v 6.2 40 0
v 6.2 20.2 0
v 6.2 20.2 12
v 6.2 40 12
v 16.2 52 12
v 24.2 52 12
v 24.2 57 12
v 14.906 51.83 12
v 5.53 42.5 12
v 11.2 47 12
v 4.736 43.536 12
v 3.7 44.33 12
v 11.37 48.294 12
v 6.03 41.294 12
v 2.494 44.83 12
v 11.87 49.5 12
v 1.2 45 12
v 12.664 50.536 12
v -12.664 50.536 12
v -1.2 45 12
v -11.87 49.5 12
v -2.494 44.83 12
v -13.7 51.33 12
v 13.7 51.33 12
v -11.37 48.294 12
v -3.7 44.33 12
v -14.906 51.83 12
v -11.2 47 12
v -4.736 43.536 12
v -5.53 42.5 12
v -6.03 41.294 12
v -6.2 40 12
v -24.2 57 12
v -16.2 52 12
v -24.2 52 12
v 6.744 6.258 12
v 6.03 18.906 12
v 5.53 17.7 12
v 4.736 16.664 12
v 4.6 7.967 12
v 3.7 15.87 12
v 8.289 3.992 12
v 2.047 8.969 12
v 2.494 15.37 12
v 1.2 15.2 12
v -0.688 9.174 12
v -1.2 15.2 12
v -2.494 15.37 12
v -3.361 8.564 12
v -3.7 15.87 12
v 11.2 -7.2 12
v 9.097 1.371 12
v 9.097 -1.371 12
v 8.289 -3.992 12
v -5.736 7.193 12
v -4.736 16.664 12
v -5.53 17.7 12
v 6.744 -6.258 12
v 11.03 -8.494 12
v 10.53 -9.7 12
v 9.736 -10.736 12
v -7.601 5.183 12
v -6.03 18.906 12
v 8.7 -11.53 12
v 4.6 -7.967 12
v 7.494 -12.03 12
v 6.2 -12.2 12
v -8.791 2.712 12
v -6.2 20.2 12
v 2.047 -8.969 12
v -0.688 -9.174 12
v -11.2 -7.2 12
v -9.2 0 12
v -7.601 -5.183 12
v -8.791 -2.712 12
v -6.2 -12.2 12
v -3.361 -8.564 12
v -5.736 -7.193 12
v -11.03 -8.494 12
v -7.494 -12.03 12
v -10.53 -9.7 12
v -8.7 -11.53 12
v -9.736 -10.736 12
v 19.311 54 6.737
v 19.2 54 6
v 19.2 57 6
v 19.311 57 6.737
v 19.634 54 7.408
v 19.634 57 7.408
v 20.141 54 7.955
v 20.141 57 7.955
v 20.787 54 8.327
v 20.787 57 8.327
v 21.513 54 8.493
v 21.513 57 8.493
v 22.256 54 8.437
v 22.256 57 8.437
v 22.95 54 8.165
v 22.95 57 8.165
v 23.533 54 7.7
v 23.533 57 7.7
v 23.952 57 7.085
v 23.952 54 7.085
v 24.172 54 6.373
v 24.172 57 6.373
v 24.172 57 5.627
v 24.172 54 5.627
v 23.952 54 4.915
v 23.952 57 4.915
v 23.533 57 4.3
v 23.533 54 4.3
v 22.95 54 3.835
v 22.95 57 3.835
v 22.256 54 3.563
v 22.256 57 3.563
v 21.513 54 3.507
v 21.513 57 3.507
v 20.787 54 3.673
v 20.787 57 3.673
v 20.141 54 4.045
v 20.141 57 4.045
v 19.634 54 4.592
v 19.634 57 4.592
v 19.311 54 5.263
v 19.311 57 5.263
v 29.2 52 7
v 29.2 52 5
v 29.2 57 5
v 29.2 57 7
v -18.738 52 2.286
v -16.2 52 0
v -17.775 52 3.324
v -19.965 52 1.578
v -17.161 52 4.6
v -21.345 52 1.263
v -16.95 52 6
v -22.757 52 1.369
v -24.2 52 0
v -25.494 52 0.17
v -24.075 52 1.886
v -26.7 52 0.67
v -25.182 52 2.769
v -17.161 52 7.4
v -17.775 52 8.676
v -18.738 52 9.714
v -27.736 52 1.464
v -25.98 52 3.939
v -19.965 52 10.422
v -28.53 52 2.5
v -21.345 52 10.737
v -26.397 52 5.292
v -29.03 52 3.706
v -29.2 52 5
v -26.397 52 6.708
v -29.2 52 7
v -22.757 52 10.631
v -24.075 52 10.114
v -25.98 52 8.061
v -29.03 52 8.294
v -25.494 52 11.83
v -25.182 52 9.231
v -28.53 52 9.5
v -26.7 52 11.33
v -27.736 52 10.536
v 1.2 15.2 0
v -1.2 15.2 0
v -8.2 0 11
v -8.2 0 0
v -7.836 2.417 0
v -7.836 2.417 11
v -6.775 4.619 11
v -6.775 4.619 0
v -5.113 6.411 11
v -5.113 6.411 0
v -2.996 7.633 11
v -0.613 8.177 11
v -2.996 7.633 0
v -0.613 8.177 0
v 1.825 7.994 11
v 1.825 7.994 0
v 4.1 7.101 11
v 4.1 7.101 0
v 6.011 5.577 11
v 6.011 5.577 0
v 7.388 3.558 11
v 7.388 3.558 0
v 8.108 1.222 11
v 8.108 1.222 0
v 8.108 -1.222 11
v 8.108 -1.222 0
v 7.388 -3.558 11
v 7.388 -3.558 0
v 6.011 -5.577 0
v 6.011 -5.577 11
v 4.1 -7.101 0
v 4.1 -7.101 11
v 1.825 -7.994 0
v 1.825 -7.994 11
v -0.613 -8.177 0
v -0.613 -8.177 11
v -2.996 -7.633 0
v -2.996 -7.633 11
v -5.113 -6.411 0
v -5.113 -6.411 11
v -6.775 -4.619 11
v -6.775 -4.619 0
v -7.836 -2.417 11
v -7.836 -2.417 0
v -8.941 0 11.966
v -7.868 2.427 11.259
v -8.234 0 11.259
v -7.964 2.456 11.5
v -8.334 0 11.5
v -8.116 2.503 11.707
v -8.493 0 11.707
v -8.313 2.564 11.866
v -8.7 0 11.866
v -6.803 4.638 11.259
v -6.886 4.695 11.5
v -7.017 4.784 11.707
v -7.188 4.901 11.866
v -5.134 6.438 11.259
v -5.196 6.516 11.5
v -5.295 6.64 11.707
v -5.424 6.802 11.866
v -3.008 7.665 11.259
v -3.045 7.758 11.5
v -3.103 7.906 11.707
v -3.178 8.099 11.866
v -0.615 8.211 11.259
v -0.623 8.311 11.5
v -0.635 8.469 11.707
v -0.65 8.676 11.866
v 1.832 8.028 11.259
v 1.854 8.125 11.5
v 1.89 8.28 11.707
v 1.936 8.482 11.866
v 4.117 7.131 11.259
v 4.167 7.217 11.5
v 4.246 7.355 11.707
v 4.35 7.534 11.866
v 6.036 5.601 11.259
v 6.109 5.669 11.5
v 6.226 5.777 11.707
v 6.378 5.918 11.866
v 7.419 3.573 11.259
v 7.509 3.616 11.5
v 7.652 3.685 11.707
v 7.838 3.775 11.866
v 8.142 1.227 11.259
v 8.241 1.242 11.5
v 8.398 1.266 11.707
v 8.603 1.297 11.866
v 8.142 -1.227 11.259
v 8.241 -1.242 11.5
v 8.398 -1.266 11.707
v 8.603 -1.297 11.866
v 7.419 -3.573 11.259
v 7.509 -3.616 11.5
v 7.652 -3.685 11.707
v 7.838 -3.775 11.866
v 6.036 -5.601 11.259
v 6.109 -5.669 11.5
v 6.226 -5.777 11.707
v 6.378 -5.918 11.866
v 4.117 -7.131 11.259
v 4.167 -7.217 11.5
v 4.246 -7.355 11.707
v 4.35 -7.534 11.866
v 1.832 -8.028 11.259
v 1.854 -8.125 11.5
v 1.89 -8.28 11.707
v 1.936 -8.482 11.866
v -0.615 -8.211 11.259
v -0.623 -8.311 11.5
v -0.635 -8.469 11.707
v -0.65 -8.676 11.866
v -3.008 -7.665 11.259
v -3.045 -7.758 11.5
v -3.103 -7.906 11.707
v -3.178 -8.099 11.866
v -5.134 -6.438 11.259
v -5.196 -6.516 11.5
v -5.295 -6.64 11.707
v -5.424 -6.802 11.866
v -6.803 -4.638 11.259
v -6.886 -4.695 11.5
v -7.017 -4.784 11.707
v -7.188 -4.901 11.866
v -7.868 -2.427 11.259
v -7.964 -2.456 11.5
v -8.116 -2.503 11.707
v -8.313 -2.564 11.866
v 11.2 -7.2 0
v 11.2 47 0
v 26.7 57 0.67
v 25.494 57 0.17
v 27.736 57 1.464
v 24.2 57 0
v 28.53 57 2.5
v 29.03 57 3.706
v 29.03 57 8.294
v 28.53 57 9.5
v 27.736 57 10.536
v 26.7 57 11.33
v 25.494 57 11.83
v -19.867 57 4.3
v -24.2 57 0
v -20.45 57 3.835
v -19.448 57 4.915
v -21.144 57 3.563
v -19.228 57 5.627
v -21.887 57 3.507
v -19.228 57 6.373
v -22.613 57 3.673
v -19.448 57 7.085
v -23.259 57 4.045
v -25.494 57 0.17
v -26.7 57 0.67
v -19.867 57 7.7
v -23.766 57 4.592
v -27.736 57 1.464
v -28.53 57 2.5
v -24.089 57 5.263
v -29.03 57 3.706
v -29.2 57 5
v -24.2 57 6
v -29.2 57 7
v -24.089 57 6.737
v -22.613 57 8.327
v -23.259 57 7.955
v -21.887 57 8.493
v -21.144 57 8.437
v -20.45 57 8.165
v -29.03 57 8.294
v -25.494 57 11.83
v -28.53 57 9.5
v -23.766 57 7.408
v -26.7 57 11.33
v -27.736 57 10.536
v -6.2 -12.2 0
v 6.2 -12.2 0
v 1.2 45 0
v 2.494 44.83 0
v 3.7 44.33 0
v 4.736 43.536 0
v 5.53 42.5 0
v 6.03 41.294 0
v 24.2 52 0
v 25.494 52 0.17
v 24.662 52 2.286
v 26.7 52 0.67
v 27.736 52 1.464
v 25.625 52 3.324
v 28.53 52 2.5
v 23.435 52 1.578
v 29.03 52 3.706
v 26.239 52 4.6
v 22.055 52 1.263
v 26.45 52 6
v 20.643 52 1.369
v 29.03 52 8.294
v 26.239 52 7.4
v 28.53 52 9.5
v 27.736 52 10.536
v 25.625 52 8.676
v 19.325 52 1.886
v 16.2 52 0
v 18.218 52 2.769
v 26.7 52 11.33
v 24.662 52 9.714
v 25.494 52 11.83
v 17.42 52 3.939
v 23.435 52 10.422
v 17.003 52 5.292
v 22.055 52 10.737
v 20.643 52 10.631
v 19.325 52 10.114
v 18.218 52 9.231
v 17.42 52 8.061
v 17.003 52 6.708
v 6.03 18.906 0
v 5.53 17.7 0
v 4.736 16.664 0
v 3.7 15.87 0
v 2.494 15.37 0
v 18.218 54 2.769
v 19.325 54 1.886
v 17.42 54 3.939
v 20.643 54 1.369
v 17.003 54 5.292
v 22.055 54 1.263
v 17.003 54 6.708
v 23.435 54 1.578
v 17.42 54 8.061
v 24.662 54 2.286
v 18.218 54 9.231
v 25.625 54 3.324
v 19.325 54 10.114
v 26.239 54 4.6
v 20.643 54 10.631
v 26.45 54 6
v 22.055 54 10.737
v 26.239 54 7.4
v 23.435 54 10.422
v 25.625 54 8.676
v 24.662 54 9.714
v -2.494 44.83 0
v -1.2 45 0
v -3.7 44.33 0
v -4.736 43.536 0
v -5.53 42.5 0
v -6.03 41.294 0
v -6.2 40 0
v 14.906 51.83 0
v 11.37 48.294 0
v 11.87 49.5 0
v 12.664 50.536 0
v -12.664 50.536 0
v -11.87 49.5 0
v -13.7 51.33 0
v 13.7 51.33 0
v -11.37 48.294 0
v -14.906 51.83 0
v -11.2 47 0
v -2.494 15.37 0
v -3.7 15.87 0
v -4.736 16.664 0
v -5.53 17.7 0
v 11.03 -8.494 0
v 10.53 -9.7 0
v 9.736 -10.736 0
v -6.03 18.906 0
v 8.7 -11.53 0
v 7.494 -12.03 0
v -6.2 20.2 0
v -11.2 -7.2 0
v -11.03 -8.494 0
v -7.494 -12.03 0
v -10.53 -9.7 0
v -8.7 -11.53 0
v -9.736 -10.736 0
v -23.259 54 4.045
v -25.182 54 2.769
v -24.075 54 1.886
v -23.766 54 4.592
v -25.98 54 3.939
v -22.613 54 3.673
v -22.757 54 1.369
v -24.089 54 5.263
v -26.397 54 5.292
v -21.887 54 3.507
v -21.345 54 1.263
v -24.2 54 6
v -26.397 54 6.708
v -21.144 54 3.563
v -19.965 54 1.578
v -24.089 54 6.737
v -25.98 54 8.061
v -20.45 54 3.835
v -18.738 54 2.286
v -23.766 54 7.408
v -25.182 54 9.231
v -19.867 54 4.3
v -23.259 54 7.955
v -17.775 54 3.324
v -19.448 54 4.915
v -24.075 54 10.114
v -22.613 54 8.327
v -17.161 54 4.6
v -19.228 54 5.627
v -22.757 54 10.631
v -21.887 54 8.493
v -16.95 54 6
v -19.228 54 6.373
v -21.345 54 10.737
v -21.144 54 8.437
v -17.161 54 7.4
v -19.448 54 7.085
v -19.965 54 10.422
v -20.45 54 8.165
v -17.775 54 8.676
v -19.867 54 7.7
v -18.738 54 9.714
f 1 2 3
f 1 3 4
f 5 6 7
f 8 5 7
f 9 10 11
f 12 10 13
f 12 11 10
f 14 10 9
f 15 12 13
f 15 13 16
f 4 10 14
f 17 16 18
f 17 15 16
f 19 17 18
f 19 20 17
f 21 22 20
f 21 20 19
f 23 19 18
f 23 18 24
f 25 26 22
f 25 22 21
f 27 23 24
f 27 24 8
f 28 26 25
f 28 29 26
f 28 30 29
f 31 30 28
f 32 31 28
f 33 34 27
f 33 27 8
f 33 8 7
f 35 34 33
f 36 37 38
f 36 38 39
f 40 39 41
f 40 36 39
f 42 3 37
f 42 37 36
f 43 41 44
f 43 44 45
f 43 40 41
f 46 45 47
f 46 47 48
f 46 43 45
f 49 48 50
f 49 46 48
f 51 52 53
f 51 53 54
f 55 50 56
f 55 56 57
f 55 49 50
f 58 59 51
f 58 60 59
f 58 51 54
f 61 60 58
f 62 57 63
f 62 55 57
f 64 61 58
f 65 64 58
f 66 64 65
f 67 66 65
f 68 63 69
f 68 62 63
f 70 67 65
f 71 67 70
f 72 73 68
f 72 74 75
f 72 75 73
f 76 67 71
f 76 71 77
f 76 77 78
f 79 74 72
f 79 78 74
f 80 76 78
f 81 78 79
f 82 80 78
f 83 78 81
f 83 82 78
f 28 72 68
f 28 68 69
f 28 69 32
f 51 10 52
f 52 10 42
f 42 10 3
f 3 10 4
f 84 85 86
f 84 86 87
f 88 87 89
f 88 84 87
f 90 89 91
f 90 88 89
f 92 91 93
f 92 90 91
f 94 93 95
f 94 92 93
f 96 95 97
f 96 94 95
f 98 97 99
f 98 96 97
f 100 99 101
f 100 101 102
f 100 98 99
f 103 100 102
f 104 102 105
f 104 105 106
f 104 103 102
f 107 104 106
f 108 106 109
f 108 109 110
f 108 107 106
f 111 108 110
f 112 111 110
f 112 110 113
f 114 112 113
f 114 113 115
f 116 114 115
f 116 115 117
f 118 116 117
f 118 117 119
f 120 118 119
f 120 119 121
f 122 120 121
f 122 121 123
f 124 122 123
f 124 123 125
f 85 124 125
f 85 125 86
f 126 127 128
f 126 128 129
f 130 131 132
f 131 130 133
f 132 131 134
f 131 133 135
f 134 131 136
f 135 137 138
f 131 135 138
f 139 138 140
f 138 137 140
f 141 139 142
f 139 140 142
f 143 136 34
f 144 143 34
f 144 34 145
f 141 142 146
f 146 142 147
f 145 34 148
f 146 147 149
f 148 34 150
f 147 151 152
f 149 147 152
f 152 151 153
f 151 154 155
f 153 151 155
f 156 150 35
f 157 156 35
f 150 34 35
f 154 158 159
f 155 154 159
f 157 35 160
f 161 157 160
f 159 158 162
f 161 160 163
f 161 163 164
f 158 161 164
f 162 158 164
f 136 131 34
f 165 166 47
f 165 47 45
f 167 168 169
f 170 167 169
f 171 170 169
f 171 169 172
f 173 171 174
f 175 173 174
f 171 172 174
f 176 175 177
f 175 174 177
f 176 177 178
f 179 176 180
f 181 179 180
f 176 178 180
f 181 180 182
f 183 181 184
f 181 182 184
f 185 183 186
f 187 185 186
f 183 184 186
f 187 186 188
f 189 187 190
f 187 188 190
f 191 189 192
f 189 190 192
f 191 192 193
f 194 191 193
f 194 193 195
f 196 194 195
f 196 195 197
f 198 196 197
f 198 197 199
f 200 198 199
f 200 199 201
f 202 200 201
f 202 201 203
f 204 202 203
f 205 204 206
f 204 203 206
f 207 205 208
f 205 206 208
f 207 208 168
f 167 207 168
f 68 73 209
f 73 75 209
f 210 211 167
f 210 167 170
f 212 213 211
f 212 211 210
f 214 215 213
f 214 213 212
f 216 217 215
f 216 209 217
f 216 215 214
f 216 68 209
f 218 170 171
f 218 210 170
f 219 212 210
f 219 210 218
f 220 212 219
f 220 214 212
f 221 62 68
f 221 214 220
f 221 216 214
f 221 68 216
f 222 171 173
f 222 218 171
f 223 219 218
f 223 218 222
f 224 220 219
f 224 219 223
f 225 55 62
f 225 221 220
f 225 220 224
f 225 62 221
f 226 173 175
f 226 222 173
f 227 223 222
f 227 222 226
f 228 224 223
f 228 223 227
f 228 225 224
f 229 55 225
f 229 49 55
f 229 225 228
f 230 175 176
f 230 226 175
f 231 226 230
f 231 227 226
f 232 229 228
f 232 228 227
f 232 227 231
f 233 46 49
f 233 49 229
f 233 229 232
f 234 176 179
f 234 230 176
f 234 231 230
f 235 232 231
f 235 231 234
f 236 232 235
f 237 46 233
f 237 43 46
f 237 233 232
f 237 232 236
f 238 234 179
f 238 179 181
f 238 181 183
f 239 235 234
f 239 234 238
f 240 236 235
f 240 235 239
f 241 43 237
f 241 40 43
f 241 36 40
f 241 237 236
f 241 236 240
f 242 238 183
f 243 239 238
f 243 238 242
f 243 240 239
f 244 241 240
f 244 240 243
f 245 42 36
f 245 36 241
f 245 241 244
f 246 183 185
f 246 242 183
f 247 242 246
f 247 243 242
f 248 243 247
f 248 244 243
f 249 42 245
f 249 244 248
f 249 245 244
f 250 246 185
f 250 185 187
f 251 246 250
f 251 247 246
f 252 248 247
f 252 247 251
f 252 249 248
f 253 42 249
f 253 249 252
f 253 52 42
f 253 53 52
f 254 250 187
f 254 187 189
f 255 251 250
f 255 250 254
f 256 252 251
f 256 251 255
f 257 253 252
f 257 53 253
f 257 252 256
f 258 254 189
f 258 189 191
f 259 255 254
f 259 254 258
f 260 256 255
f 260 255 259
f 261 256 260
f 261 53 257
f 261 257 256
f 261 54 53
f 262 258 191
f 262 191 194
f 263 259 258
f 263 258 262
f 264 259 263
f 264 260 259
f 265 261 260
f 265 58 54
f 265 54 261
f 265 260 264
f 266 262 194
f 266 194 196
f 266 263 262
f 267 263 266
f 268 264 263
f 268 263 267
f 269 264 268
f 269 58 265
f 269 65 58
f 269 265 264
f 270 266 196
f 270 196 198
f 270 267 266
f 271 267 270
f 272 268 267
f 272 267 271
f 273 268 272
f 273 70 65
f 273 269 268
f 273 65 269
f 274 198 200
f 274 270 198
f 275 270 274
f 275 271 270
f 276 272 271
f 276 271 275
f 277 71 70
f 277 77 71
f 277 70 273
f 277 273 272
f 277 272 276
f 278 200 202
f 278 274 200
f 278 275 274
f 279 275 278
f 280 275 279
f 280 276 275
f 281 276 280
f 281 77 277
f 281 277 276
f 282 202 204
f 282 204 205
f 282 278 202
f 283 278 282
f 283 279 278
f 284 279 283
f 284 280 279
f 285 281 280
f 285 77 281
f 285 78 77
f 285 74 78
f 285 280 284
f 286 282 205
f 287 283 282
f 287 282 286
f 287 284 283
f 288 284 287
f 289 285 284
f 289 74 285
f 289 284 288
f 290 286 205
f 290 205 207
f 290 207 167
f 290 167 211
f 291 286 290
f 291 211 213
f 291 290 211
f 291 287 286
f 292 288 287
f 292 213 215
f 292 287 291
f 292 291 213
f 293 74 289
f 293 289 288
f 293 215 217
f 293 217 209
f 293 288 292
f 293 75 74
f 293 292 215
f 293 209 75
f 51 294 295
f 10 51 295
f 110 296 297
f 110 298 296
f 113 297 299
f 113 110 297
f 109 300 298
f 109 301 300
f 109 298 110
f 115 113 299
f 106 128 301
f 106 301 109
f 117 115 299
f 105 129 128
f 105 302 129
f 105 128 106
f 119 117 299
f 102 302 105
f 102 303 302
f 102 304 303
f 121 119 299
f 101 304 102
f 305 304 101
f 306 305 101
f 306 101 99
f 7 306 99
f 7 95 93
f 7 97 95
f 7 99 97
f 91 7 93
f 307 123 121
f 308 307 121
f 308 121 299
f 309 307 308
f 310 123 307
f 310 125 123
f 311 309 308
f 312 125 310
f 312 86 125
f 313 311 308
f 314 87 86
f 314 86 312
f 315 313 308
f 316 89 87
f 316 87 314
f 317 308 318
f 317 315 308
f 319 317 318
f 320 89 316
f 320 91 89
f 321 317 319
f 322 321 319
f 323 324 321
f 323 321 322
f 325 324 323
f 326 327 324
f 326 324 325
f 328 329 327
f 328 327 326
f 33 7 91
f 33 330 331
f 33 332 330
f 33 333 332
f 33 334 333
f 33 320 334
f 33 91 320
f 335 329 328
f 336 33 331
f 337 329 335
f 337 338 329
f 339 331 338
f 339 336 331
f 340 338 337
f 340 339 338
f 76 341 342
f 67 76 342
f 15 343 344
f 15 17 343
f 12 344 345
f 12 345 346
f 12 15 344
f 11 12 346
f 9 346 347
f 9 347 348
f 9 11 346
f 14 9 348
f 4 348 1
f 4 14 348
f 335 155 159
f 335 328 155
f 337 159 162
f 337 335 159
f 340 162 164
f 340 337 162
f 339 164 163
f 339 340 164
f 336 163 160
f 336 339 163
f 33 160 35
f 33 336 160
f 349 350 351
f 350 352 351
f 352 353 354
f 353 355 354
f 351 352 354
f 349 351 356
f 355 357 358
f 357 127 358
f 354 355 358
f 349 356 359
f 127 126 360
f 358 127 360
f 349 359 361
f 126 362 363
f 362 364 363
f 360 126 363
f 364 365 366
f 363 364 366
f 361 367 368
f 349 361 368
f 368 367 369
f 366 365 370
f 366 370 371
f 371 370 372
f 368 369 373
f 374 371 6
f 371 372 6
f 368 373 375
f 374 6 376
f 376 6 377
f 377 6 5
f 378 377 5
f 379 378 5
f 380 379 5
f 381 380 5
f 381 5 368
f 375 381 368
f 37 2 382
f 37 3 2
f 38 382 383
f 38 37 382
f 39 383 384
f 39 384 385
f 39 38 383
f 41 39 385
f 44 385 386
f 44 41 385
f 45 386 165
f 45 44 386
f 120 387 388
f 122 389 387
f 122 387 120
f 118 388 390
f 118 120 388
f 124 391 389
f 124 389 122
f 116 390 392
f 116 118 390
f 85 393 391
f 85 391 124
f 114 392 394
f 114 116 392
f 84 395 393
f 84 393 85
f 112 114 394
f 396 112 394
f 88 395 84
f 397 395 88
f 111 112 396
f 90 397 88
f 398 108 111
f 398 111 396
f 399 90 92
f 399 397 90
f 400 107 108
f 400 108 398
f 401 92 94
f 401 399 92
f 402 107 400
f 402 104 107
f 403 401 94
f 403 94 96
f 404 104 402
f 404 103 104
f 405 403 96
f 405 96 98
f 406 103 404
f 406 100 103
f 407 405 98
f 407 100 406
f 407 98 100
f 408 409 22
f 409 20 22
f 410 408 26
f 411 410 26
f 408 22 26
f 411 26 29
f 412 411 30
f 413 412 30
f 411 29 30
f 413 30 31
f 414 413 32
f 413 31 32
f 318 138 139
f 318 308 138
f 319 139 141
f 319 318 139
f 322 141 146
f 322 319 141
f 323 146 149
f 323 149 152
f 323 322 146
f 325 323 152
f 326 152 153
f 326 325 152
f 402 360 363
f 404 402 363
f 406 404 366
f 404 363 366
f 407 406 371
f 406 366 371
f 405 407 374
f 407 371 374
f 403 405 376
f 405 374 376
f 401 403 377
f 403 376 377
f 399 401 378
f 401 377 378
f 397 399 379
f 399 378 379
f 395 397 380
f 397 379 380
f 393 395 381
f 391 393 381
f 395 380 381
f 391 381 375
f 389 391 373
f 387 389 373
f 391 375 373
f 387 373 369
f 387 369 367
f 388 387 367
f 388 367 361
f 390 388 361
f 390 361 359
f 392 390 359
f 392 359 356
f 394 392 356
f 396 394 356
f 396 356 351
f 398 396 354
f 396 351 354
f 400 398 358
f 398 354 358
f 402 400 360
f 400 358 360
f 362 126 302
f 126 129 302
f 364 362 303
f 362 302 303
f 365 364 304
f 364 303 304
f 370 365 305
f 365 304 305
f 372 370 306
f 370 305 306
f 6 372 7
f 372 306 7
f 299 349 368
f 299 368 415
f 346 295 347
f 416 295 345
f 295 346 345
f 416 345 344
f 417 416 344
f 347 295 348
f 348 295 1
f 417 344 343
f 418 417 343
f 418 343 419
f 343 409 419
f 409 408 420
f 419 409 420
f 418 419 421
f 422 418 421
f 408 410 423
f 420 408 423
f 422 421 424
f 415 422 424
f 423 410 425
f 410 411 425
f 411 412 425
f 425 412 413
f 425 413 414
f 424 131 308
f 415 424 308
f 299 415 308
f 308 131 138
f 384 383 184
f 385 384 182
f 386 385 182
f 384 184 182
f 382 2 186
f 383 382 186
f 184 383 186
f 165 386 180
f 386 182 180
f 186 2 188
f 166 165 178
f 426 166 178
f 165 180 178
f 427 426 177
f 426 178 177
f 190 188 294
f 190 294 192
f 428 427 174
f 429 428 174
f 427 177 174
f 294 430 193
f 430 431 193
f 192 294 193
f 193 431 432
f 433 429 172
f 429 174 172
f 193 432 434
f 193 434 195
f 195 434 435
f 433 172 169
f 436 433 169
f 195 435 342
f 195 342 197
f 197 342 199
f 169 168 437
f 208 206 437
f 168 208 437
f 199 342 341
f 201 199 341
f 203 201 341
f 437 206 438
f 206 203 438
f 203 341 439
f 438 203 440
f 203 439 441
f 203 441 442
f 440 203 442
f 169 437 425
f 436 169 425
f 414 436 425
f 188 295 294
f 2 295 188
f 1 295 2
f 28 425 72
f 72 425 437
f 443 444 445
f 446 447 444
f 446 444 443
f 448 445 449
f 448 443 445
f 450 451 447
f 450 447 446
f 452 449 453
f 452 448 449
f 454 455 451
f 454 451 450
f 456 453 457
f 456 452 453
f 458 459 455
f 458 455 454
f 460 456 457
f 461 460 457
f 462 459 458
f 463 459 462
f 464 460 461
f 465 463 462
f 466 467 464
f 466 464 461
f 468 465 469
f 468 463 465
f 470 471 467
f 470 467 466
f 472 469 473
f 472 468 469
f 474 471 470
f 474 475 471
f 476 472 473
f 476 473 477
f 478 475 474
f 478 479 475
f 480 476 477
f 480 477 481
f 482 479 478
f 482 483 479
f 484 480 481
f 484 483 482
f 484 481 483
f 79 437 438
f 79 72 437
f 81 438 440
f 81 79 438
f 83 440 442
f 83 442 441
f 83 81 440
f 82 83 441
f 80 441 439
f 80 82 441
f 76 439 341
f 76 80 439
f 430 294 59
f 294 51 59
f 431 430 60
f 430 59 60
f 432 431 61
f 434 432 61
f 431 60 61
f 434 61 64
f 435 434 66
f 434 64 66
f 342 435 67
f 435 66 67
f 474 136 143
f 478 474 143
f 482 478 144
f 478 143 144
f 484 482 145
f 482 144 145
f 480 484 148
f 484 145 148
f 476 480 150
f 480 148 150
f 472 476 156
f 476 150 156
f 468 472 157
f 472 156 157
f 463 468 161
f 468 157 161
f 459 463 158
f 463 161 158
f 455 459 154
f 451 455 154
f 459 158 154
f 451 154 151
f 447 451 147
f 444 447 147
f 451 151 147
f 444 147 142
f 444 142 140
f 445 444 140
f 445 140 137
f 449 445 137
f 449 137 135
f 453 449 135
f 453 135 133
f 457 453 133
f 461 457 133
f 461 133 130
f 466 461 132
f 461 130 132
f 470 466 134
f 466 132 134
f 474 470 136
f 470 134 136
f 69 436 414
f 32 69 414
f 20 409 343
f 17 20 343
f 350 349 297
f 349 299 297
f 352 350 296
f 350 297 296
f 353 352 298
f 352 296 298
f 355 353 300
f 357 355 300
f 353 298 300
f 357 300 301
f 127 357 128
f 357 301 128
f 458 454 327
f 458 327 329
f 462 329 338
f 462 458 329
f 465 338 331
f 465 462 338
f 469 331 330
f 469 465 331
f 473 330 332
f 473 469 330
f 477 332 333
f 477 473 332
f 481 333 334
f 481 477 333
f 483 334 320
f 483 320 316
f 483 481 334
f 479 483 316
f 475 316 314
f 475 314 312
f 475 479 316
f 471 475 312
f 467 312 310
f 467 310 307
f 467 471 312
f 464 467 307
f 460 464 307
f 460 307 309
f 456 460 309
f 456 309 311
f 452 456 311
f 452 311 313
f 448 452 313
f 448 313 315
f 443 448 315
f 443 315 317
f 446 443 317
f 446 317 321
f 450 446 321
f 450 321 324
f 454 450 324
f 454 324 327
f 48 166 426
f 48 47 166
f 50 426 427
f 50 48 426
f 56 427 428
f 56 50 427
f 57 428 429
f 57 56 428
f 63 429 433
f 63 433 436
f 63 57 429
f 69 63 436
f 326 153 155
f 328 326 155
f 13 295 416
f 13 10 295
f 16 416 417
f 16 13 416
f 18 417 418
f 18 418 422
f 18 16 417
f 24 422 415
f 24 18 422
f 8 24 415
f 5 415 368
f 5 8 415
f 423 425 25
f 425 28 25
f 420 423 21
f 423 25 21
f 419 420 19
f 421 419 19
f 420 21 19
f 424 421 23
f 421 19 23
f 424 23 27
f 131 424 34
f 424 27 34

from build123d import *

# Parameters (mm, degrees)
F0_W     = 12.4
F0_H     = 29.8
F1_DEPTH = 12
F2_W     = 58.4
F2_H     = 12
F2_R     = 2.5
F3_DEPTH = 5
F4_R     = 5
F5_R     = 5
F6_R     = 5
F7_R     = 4.75
F8_DEPTH = 2
F9_R     = 1
F10_R    = 5


# Not quite as in the source:
# - a feature names something its author has since deleted; it is built from what else it names


with BuildPart() as f1:
    # F0 (on Top) → F1 (new body)
    with BuildSketch(Plane.XY):
        with BuildLine():
            ThreePointArc((-8.2, 0), (0, 8.2), (8.2, 0))
            Line((8.2, 0), (11.2, 0))
            Line((11.2, 0), (11.2, 52))
            Line((11.2, 52), (0, 52))
            Line((0, 52), (-11.2, 52))
            Line((-11.2, 52), (-11.2, 0))
            Line((-11.2, 0), (-8.2, 0))
        make_face()
        with Locations((0, 30.1)):
            Rectangle(F0_W, F0_H, mode=Mode.SUBTRACT)
        with BuildLine():
            Line((11.2, 0), (8.2, 0))
            ThreePointArc((8.2, 0), (0, -8.2), (-8.2, 0))
            Line((-8.2, 0), (-11.2, 0))
            Line((-11.2, 0), (-11.2, -12.2))
            Line((-11.2, -12.2), (0, -12.2))
            Line((0, -12.2), (11.2, -12.2))
            Line((11.2, -12.2), (11.2, 0))
        make_face()
        with BuildLine():
            Line((11.2, 0), (8.2, 0))
            ThreePointArc((8.2, 0), (0, -8.2), (-8.2, 0))
            Line((-8.2, 0), (-11.2, 0))
            Line((-11.2, 0), (-11.2, -12.2))
            Line((-11.2, -12.2), (0, -12.2))
            Line((0, -12.2), (11.2, -12.2))
            Line((11.2, -12.2), (11.2, 0))
        make_face()
    extrude(amount=F1_DEPTH)

    # F2 (on face) → F3 (join)
    with BuildSketch(Plane(origin=(0, 52, 0), x_dir=(-1, 0, 0), z_dir=(0, 1, 0))):
        with Locations((0, 6)):
            Rectangle(F2_W, F2_H)
        with Locations((-21.7, 6)):
            Circle(F2_R, mode=Mode.SUBTRACT)
        with Locations((21.7, 6)):
            Circle(F2_R, mode=Mode.SUBTRACT)
    extrude(amount=F3_DEPTH)

    # F4
    f4_edges = [f1.edges().sort_by_distance(p)[0] for p in [
        (-11.2, -12.2, 6),
        (11.2, -12.2, 6),
    ]]
    fillet(f4_edges, radius=F4_R)

    # F5
    f5_edges = [f1.edges().sort_by_distance(p)[0] for p in [
        (11.2, 52, 6),
        (-11.2, 52, 6),
    ]]
    fillet(f5_edges, radius=F5_R)

    # F6
    f6_edges = [f1.edges().sort_by_distance(p)[0] for p in [
        (-29.2, 54.5, 12),
        (-29.2, 54.5, 0),
        (29.2, 54.5, 0),
        (29.2, 54.5, 12),
    ]]
    fillet(f6_edges, radius=F6_R)

    # F7 (on face) → F8 (cut)
    with BuildSketch(Plane.XZ.offset(-52)):
        with Locations((21.7, 6)):
            Circle(F7_R)
        with Locations((-21.7, 6)):
            Circle(F7_R)
    extrude(amount=-F8_DEPTH, mode=Mode.SUBTRACT)

    # F9
    f9_edges = [f1.edges().sort_by_distance(p)[0] for p in [
        (8.2, 0, 12),
    ]]
    fillet(f9_edges, radius=F9_R)

    # F10
    f10_edges = [f1.edges().sort_by_distance(p)[0] for p in [
        (-6.2, 45, 6),
        (6.2, 45, 6),
        (-6.2, 15.2, 6),
        (6.2, 15.2, 6),
    ]]
    fillet(f10_edges, radius=F10_R)


solid = f1.part
